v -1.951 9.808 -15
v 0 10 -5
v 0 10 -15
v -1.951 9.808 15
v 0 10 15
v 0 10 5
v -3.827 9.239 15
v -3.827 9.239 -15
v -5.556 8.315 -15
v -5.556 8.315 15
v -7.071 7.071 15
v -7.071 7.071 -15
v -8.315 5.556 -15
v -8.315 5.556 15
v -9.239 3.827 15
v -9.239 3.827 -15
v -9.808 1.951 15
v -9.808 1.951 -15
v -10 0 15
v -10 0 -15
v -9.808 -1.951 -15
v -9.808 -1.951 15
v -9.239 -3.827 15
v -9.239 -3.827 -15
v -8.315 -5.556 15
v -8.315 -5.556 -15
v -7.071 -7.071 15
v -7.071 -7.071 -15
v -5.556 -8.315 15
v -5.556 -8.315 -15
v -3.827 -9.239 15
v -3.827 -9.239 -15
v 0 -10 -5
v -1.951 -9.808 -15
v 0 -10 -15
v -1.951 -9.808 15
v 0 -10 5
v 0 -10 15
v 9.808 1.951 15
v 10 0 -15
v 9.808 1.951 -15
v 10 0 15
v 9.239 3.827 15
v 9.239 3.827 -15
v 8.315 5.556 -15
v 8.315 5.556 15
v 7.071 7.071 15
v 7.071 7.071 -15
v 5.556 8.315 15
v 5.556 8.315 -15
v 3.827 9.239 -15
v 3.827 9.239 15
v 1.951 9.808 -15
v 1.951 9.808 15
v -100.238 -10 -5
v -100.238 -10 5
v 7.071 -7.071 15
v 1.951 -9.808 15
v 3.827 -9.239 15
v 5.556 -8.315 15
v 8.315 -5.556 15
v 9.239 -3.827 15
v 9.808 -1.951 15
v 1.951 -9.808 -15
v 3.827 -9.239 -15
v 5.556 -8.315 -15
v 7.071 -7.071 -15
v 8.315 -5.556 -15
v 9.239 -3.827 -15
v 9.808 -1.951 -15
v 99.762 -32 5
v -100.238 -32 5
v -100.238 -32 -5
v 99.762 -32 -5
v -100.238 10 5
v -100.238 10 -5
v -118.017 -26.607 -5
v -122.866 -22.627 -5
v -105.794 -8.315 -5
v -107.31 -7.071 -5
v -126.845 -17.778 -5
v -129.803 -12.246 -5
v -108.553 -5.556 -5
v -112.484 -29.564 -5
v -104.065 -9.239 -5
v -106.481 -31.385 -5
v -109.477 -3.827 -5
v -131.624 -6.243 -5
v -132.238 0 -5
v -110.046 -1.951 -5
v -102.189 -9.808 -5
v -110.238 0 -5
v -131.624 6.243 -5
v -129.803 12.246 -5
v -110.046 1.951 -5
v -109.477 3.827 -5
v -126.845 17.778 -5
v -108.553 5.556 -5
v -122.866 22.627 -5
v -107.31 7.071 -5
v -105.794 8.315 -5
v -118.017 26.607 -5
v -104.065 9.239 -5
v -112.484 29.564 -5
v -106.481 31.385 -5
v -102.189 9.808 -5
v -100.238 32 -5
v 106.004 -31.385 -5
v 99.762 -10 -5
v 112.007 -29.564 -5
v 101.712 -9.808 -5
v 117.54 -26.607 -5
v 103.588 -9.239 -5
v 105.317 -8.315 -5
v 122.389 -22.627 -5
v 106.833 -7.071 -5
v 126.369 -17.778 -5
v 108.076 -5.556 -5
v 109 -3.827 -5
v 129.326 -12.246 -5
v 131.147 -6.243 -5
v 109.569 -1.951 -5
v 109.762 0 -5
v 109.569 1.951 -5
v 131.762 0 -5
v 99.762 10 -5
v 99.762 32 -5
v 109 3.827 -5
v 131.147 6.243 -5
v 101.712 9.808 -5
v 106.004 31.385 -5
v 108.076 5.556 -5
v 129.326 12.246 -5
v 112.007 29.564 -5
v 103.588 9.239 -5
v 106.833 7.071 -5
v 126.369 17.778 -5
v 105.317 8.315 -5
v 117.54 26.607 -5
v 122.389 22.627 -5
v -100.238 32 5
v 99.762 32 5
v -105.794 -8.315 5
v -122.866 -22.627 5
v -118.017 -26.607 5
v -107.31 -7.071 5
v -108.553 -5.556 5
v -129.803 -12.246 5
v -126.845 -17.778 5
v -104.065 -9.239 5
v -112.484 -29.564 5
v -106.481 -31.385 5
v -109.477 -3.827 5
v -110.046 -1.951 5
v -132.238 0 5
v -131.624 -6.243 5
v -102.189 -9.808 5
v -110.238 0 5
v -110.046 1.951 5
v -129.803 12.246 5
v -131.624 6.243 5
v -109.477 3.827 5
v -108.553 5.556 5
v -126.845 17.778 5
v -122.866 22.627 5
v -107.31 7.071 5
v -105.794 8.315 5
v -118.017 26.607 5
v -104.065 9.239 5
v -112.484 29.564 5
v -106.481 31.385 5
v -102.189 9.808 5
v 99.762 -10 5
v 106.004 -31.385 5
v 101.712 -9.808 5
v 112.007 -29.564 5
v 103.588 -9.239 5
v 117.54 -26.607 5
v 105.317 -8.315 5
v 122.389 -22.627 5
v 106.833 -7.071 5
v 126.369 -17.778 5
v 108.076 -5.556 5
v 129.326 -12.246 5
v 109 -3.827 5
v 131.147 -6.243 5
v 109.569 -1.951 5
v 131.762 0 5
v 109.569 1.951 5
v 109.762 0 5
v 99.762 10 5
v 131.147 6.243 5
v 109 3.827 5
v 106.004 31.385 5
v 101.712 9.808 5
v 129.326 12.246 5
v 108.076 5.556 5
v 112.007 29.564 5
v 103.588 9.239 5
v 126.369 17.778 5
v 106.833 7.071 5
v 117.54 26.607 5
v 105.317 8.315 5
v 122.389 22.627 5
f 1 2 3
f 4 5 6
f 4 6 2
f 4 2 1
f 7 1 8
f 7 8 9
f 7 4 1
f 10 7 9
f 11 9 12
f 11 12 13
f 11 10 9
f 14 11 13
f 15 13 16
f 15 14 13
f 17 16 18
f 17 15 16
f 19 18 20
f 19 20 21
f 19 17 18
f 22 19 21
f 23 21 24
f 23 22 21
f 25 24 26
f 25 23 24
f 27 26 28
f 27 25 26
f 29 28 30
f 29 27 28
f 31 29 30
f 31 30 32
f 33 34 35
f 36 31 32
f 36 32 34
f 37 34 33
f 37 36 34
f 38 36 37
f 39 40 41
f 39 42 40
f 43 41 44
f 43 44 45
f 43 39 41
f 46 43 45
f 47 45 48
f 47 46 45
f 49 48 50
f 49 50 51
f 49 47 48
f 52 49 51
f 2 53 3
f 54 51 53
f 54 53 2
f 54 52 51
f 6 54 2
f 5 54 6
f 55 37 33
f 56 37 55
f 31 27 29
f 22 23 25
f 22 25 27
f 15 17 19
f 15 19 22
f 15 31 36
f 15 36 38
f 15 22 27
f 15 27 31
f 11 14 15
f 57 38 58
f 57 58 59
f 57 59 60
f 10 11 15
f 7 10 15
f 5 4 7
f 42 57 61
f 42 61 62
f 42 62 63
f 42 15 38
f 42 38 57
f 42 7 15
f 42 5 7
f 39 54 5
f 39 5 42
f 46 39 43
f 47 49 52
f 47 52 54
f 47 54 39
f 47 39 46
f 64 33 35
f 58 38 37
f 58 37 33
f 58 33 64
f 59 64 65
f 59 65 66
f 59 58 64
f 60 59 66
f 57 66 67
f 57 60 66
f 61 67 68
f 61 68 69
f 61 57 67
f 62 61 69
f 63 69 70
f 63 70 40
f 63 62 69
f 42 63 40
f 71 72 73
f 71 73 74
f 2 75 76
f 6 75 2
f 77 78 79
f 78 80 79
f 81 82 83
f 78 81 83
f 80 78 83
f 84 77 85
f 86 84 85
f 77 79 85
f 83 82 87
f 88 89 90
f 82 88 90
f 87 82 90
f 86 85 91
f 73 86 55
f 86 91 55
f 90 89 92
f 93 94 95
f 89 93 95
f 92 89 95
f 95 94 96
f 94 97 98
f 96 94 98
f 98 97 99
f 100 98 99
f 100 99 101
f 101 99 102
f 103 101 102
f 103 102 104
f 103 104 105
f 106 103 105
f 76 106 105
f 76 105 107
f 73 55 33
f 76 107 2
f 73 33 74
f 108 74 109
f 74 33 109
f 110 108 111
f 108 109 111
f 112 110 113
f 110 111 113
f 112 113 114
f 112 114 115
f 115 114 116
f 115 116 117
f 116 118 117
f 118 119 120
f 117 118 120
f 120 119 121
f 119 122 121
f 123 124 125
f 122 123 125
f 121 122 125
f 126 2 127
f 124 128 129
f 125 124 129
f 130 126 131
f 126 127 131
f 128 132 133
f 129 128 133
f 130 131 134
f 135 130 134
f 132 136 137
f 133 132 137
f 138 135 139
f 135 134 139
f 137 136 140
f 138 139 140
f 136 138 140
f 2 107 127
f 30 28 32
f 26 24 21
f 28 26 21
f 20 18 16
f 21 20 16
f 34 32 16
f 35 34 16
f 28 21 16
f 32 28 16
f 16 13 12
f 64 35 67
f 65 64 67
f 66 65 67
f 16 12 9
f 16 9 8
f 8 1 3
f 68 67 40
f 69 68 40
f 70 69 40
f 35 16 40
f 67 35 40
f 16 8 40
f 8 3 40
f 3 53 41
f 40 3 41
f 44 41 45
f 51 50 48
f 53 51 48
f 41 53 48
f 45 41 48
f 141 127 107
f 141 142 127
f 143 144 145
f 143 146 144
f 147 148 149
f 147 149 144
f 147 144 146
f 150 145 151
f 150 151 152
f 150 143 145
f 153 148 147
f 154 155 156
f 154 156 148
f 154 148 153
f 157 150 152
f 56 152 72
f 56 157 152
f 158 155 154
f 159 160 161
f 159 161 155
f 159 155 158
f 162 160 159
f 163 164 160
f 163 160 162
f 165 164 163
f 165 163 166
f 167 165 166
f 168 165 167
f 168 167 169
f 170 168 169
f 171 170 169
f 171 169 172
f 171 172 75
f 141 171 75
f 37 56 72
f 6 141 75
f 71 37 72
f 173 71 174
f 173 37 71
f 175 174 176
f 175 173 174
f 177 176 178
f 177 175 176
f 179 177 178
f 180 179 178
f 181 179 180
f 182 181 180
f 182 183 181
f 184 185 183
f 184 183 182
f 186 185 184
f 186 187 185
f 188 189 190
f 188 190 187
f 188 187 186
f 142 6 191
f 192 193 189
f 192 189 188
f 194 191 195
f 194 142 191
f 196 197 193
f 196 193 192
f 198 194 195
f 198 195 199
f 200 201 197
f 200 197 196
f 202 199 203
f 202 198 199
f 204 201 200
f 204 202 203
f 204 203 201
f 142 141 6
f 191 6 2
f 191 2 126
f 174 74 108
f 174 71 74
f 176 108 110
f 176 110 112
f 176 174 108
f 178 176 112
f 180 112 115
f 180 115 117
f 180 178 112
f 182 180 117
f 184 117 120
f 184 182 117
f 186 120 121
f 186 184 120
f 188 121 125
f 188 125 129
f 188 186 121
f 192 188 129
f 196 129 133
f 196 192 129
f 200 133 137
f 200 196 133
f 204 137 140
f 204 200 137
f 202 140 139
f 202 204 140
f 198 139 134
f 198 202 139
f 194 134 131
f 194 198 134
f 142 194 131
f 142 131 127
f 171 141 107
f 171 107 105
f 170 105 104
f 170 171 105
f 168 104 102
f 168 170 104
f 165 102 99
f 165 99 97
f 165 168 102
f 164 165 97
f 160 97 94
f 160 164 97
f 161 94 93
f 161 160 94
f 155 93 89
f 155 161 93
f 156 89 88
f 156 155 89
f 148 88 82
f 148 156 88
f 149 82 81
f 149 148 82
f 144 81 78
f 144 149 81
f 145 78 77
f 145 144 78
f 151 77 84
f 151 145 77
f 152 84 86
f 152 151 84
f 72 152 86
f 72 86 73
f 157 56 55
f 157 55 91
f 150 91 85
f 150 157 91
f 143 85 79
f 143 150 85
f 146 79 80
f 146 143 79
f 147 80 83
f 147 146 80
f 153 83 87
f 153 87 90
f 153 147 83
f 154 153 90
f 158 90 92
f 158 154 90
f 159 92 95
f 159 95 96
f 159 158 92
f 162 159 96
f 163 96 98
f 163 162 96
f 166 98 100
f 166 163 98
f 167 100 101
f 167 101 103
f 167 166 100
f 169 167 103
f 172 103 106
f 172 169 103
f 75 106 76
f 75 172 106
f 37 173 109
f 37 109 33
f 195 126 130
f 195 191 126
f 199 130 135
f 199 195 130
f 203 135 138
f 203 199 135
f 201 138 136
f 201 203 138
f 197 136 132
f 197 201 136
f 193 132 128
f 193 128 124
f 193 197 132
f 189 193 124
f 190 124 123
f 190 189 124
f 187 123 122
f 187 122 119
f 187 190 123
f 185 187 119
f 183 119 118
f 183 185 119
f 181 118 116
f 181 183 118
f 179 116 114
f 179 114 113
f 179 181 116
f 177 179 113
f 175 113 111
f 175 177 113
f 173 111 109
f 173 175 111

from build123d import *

# Parameters (mm, degrees)
F1_DEPTH = 5
F2_DEPTH = 15


with BuildPart() as f1:
    # F0 (on Top) → F1 (new body, symmetric)
    with BuildSketch(Plane.XY):
        with BuildLine():
            Line((99.761558, 32.000002), (-100.238442, 32.000002))
            ThreePointArc((-100.238442, 32.000002), (-132.238444, 0), (-100.238442, -32.000002))
            Line((-100.238442, -32.000002), (99.761558, -32.000002))
            ThreePointArc((99.761558, -32.000002), (131.761559, 0), (99.761558, 32.000002))
        make_face()
        with BuildLine():
            Line((0, -10), (-100.238442, -10))
            ThreePointArc((-100.238442, -10), (-110.238442, 0), (-100.238442, 10))
            Line((-100.238442, 10), (0, 10))
            Line((0, 10), (99.761558, 10))
            ThreePointArc((99.761558, 10), (109.761558, 0), (99.761558, -10))
            Line((99.761558, -10), (0, -10))
        make_face(mode=Mode.SUBTRACT)
    extrude(amount=F1_DEPTH, both=True)

    # F0 (on Top) → F2 (join, symmetric)
    with BuildSketch(Plane.XY):
        with BuildLine():
            ThreePointArc((0, 10), (-10, 0), (0, -10))
            ThreePointArc((0, -10), (7.071068, -7.071068), (10, 0))
            ThreePointArc((10, 0), (7.071068, 7.071068), (0, 10))
        make_face()
    extrude(amount=F2_DEPTH, both=True)


solid = f1.part
